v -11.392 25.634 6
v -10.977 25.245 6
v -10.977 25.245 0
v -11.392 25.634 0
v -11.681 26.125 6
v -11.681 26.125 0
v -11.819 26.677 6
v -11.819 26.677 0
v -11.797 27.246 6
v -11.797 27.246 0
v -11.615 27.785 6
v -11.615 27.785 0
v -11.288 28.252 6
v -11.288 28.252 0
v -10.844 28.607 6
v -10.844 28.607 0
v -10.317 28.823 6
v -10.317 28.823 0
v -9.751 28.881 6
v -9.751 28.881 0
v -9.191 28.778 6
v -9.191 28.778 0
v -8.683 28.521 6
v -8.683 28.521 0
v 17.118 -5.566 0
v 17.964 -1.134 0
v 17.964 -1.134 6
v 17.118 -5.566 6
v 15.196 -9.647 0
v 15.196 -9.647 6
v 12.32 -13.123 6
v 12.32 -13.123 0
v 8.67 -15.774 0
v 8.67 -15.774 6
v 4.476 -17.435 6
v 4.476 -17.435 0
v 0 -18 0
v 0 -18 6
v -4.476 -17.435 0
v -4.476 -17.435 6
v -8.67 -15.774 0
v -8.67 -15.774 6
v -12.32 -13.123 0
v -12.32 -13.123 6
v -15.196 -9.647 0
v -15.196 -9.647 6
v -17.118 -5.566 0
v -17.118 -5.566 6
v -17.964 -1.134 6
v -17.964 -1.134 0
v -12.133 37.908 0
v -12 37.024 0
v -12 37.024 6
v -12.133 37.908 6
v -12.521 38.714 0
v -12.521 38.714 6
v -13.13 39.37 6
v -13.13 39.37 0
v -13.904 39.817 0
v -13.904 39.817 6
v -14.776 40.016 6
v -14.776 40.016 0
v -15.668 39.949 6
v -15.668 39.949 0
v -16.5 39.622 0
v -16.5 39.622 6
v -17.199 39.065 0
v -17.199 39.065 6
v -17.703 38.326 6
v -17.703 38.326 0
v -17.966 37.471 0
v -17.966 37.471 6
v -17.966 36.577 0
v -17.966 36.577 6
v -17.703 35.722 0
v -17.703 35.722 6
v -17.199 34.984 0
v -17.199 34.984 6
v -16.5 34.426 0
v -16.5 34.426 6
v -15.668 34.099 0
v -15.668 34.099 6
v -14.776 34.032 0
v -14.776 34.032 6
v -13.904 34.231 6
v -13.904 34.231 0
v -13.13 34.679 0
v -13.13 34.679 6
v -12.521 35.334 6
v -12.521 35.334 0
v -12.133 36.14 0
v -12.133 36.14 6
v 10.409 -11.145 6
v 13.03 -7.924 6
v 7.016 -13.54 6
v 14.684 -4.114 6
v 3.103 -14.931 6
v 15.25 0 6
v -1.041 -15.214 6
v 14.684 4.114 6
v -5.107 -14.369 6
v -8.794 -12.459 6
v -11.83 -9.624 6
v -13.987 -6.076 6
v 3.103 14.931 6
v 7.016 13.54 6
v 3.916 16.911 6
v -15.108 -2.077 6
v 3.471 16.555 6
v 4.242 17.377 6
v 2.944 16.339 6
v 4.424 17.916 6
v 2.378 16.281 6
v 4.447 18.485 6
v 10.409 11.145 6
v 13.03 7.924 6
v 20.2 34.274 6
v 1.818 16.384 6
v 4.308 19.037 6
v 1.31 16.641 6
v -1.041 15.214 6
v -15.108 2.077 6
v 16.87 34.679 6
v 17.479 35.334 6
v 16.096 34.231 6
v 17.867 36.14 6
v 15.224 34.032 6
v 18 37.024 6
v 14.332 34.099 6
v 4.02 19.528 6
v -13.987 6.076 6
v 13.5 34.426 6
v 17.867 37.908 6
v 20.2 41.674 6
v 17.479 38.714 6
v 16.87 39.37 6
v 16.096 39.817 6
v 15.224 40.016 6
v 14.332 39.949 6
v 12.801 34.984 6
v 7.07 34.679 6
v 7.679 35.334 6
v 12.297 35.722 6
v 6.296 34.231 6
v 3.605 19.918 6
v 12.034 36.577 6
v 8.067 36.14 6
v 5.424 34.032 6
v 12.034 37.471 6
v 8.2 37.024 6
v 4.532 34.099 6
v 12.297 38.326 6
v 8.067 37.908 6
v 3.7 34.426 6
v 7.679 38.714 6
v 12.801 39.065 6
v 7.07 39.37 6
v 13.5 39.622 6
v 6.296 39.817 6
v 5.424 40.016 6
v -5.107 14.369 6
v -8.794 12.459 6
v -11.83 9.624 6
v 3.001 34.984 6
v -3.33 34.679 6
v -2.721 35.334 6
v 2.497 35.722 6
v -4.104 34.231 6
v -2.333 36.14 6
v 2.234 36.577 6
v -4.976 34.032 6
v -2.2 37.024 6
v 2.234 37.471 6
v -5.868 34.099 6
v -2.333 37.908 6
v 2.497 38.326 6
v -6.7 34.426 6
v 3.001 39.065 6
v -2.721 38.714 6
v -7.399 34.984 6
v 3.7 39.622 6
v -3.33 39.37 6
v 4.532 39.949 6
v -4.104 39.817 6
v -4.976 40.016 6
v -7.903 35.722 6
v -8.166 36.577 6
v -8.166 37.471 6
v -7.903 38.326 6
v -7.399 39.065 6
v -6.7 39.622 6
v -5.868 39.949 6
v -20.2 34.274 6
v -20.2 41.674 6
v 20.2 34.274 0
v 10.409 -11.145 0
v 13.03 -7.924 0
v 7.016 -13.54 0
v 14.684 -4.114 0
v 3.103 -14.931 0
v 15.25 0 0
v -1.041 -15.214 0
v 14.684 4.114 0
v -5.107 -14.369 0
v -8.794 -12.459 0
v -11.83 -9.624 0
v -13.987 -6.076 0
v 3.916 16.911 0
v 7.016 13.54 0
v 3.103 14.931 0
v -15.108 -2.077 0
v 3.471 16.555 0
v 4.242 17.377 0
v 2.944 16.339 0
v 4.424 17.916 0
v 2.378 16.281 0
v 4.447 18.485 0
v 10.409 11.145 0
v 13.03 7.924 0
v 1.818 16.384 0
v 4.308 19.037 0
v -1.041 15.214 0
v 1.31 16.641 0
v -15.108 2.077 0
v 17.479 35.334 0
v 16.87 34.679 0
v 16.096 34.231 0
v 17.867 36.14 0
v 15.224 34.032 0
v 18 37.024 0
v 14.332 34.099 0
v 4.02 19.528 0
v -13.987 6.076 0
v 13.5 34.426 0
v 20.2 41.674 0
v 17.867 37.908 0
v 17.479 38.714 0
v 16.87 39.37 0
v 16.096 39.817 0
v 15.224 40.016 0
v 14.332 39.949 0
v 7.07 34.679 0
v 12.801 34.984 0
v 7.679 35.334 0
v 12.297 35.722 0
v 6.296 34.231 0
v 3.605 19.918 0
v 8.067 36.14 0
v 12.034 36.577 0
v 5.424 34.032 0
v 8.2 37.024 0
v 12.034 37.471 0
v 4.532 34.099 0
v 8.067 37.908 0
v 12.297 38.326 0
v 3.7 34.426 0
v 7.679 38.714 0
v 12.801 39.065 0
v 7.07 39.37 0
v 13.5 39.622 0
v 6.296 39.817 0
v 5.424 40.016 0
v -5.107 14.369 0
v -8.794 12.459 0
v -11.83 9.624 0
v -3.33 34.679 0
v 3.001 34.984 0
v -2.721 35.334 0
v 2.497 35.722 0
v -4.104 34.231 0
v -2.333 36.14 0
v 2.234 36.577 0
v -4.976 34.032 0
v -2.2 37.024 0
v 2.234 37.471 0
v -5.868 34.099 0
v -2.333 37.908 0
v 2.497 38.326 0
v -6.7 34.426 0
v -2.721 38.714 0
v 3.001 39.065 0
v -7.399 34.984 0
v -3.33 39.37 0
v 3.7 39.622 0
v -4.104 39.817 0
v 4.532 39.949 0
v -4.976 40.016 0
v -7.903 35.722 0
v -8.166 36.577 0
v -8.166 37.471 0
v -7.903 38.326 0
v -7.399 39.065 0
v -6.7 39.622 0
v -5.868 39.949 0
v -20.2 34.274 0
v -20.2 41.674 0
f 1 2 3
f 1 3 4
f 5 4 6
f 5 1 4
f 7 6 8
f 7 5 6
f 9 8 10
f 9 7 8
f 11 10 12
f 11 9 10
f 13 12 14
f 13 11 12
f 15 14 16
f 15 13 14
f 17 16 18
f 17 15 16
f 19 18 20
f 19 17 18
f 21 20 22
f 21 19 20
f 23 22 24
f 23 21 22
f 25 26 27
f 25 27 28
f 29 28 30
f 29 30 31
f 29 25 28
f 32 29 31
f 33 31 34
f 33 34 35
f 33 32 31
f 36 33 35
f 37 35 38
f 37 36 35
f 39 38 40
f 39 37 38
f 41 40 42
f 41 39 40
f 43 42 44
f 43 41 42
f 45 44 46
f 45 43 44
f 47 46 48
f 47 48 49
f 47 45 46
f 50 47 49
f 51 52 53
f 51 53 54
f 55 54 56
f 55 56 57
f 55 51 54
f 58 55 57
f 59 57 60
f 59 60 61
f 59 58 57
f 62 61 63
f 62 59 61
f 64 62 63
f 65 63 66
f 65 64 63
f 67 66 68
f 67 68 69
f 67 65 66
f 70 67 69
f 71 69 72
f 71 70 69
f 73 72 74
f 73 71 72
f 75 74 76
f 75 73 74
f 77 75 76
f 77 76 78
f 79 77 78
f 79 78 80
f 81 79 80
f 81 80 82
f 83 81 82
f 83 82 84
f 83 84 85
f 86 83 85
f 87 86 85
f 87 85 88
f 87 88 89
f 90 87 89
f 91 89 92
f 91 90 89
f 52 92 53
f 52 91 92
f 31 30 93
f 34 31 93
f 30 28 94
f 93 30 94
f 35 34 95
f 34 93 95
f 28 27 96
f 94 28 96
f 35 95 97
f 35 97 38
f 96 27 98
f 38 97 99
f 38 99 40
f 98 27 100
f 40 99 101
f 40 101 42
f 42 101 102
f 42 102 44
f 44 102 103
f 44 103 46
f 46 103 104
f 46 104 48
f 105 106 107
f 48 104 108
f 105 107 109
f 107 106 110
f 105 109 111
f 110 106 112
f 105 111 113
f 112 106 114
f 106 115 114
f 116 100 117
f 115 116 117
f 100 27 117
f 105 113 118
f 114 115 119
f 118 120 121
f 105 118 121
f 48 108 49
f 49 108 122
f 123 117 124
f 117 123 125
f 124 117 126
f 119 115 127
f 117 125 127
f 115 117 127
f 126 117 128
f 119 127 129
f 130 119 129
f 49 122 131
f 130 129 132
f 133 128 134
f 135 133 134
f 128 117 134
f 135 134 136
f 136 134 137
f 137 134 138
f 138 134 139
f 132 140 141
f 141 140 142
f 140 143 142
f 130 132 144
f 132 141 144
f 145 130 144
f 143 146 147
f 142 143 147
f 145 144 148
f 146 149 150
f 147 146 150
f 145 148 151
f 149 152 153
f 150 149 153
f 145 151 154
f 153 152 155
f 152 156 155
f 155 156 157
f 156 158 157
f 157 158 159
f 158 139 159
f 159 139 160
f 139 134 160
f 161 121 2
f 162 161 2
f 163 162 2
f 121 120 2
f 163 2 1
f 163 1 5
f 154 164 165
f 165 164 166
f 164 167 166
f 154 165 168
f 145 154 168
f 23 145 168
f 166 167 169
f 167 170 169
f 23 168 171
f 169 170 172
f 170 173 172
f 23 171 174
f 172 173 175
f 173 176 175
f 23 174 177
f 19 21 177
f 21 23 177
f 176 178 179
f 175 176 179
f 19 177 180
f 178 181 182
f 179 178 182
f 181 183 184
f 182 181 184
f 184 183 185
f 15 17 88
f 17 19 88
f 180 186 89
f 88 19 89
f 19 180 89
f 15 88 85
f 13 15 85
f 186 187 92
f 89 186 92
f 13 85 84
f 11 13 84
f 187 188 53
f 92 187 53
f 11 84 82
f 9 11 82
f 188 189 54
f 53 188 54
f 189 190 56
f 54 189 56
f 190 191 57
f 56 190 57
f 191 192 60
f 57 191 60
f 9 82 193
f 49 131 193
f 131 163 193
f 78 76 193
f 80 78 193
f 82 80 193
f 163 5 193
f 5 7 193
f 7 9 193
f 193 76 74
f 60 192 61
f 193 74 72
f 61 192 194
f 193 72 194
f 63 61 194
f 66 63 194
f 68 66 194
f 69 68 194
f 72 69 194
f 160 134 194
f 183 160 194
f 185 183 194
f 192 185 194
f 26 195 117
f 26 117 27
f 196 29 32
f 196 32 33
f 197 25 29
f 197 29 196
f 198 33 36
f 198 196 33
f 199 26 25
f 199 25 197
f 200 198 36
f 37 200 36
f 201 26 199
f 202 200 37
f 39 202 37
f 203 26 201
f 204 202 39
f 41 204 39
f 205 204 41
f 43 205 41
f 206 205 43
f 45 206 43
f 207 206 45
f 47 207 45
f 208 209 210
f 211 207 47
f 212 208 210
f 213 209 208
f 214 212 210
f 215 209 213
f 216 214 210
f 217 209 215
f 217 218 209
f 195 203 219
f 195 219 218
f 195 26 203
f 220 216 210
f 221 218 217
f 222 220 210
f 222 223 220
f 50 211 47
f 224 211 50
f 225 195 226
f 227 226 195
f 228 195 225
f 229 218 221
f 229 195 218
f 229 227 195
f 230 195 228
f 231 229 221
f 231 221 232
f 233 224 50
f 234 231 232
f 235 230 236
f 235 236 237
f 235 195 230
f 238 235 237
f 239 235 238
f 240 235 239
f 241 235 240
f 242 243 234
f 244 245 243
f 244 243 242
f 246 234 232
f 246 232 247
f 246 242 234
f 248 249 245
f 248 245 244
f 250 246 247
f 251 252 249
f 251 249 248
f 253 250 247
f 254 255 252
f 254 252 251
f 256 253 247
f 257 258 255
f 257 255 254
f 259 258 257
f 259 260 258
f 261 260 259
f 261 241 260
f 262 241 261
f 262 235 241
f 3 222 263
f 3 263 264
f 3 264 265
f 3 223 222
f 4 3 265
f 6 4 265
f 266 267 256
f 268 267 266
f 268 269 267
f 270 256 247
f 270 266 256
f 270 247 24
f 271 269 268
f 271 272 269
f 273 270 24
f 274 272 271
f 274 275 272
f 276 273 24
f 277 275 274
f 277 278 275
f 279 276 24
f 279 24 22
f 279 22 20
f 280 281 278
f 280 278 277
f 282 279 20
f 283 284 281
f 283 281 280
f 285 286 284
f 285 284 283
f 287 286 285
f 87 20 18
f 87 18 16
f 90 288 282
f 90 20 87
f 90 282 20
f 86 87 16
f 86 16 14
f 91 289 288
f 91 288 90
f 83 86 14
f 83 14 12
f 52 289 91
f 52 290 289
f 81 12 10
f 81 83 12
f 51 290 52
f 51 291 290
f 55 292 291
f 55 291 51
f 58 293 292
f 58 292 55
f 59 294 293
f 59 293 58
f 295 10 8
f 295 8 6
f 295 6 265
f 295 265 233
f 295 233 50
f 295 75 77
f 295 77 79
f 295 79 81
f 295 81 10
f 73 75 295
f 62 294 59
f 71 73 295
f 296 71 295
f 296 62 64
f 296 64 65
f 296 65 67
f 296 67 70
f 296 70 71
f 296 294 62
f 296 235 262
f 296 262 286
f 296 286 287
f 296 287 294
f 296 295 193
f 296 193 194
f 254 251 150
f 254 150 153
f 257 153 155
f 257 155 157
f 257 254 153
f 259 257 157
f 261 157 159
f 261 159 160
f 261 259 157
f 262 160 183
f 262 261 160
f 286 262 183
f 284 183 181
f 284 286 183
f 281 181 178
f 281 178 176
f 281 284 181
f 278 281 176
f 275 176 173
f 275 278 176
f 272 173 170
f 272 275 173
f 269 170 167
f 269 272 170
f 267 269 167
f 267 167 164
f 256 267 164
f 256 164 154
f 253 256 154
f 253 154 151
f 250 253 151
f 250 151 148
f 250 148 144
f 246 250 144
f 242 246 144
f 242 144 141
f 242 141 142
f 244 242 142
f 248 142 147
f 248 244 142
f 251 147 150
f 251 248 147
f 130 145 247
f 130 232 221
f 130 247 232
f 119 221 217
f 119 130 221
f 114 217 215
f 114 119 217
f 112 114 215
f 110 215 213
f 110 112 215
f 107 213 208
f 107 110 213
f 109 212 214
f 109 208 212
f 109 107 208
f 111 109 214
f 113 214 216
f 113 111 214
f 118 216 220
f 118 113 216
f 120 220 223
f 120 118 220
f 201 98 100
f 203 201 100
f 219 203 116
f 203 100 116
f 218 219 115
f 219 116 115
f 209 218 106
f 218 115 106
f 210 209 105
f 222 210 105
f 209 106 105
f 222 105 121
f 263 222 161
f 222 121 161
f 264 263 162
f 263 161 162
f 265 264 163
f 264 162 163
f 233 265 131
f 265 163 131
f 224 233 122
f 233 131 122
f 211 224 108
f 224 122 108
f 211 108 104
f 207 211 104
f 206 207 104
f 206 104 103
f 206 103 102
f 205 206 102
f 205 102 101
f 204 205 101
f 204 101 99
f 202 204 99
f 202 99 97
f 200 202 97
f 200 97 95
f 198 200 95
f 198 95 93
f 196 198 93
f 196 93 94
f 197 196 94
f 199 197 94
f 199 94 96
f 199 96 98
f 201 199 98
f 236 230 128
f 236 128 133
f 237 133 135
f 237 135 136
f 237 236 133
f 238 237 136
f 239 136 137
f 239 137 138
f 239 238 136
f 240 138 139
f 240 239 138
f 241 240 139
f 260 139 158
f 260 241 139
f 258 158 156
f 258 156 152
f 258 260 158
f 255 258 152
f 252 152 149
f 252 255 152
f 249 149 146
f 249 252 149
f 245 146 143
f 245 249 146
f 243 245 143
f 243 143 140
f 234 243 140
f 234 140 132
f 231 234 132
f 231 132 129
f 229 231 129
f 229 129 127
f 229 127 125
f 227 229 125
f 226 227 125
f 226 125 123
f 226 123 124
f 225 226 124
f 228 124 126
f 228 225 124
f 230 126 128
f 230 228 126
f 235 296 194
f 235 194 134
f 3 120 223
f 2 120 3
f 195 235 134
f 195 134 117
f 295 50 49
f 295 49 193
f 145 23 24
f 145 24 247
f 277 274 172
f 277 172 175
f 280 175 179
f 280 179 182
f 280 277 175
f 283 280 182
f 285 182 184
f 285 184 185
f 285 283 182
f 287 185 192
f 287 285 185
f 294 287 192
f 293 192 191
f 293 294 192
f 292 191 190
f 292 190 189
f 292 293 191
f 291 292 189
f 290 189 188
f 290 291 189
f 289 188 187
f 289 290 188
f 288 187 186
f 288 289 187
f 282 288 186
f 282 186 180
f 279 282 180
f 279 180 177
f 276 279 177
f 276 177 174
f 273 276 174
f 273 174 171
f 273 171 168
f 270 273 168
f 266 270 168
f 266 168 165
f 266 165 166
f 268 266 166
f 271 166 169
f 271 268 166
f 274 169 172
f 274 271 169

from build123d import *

# Parameters (mm, degrees)
SKETCH1_R               = 7.95
SKETCH1_R_2             = 3
MAIN_BODY_LINK_B2_DEPTH = 6
CUT_EXTRUDE1_REACH      = 48.699
SKETCH2_R               = 1.5
CUT_EXTRUDE2_DEPTH      = 47.698679231
SKETCH4_R               = 15.25
CUT_EXTRUDE3_DEPTH      = 47.698679231


with BuildPart() as part:
    # Sketch1 → Main Body Link B2 (new body)
    with BuildSketch(Plane.XY):
        with BuildLine():
            Line((0, 41.674052381), (20.2, 41.674052381))
            Line((20.2, 41.674052381), (20.2, 34.274052381))
            Line((20.2, 34.274052381), (17.964224051, -1.134307826))
            ThreePointArc((17.964224051, -1.134307826), (0, -18), (-17.964224051, -1.134307826))
            Line((-17.964224051, -1.134307826), (-20.2, 34.274052381))
            Line((-20.2, 34.274052381), (-20.2, 41.674052381))
            Line((-20.2, 41.674052381), (0, 41.674052381))
        make_face()
        Circle(SKETCH1_R, mode=Mode.SUBTRACT)
        with Locations((-15, 37.024052381)):
            Circle(SKETCH1_R_2, mode=Mode.SUBTRACT)
        with Locations((-5.2, 37.024052381)):
            Circle(SKETCH1_R_2, mode=Mode.SUBTRACT)
        with Locations((5.2, 37.024052381)):
            Circle(SKETCH1_R_2, mode=Mode.SUBTRACT)
        with Locations((15, 37.024052381)):
            Circle(SKETCH1_R_2, mode=Mode.SUBTRACT)
    extrude(amount=MAIN_BODY_LINK_B2_DEPTH)

    # Sketch2 → Cut-Extrude1 (cut, up to next)
    with BuildSketch(Plane.XY.offset(6), mode=Mode.PRIVATE) as cut_extrude1_sk1:
        with Locations((-11.5, 0)):
            Circle(SKETCH2_R)
    cut_extrude1_tool1 = extrude(cut_extrude1_sk1.sketch, amount=-CUT_EXTRUDE1_REACH, mode=Mode.PRIVATE) & part.part
    # Sketch2 → Cut-Extrude1 (cut, up to next)
    with BuildSketch(Plane.XY.offset(6), mode=Mode.PRIVATE) as cut_extrude1_sk2:
        with Locations((11.5, 0)):
            Circle(SKETCH2_R)
    cut_extrude1_tool2 = extrude(cut_extrude1_sk2.sketch, amount=-CUT_EXTRUDE1_REACH, mode=Mode.PRIVATE) & part.part
    add(cut_extrude1_tool1.solids().sort_by_distance((-11.5, 0, 6))[0], mode=Mode.SUBTRACT)
    add(cut_extrude1_tool2.solids().sort_by_distance((11.5, 0, 6))[0], mode=Mode.SUBTRACT)

    # Sketch3 → Cut-Extrude2 (cut, through all)
    with BuildSketch(Plane.XY.offset(6)):
        with BuildLine():
            Line((-8.682671659, 28.521221325), (3.604609006, 19.91757478))
            ThreePointArc((3.604609006, 19.91757478), (4.095760221, 17.132117818), (1.31030326, 16.640966602))
            Line((1.31030326, 16.640966602), (-10.976977404, 25.244613148))
            ThreePointArc((-10.976977404, 25.244613148), (-11.46812862, 28.030070109), (-8.682671659, 28.521221325))
        make_face()
    extrude(amount=-CUT_EXTRUDE2_DEPTH, mode=Mode.SUBTRACT)

    # Sketch4 → Cut-Extrude3 (cut, through all)
    with BuildSketch(Plane.XY.offset(6)):
        Circle(SKETCH4_R)
    extrude(amount=-CUT_EXTRUDE3_DEPTH, mode=Mode.SUBTRACT)


solid = part.part
